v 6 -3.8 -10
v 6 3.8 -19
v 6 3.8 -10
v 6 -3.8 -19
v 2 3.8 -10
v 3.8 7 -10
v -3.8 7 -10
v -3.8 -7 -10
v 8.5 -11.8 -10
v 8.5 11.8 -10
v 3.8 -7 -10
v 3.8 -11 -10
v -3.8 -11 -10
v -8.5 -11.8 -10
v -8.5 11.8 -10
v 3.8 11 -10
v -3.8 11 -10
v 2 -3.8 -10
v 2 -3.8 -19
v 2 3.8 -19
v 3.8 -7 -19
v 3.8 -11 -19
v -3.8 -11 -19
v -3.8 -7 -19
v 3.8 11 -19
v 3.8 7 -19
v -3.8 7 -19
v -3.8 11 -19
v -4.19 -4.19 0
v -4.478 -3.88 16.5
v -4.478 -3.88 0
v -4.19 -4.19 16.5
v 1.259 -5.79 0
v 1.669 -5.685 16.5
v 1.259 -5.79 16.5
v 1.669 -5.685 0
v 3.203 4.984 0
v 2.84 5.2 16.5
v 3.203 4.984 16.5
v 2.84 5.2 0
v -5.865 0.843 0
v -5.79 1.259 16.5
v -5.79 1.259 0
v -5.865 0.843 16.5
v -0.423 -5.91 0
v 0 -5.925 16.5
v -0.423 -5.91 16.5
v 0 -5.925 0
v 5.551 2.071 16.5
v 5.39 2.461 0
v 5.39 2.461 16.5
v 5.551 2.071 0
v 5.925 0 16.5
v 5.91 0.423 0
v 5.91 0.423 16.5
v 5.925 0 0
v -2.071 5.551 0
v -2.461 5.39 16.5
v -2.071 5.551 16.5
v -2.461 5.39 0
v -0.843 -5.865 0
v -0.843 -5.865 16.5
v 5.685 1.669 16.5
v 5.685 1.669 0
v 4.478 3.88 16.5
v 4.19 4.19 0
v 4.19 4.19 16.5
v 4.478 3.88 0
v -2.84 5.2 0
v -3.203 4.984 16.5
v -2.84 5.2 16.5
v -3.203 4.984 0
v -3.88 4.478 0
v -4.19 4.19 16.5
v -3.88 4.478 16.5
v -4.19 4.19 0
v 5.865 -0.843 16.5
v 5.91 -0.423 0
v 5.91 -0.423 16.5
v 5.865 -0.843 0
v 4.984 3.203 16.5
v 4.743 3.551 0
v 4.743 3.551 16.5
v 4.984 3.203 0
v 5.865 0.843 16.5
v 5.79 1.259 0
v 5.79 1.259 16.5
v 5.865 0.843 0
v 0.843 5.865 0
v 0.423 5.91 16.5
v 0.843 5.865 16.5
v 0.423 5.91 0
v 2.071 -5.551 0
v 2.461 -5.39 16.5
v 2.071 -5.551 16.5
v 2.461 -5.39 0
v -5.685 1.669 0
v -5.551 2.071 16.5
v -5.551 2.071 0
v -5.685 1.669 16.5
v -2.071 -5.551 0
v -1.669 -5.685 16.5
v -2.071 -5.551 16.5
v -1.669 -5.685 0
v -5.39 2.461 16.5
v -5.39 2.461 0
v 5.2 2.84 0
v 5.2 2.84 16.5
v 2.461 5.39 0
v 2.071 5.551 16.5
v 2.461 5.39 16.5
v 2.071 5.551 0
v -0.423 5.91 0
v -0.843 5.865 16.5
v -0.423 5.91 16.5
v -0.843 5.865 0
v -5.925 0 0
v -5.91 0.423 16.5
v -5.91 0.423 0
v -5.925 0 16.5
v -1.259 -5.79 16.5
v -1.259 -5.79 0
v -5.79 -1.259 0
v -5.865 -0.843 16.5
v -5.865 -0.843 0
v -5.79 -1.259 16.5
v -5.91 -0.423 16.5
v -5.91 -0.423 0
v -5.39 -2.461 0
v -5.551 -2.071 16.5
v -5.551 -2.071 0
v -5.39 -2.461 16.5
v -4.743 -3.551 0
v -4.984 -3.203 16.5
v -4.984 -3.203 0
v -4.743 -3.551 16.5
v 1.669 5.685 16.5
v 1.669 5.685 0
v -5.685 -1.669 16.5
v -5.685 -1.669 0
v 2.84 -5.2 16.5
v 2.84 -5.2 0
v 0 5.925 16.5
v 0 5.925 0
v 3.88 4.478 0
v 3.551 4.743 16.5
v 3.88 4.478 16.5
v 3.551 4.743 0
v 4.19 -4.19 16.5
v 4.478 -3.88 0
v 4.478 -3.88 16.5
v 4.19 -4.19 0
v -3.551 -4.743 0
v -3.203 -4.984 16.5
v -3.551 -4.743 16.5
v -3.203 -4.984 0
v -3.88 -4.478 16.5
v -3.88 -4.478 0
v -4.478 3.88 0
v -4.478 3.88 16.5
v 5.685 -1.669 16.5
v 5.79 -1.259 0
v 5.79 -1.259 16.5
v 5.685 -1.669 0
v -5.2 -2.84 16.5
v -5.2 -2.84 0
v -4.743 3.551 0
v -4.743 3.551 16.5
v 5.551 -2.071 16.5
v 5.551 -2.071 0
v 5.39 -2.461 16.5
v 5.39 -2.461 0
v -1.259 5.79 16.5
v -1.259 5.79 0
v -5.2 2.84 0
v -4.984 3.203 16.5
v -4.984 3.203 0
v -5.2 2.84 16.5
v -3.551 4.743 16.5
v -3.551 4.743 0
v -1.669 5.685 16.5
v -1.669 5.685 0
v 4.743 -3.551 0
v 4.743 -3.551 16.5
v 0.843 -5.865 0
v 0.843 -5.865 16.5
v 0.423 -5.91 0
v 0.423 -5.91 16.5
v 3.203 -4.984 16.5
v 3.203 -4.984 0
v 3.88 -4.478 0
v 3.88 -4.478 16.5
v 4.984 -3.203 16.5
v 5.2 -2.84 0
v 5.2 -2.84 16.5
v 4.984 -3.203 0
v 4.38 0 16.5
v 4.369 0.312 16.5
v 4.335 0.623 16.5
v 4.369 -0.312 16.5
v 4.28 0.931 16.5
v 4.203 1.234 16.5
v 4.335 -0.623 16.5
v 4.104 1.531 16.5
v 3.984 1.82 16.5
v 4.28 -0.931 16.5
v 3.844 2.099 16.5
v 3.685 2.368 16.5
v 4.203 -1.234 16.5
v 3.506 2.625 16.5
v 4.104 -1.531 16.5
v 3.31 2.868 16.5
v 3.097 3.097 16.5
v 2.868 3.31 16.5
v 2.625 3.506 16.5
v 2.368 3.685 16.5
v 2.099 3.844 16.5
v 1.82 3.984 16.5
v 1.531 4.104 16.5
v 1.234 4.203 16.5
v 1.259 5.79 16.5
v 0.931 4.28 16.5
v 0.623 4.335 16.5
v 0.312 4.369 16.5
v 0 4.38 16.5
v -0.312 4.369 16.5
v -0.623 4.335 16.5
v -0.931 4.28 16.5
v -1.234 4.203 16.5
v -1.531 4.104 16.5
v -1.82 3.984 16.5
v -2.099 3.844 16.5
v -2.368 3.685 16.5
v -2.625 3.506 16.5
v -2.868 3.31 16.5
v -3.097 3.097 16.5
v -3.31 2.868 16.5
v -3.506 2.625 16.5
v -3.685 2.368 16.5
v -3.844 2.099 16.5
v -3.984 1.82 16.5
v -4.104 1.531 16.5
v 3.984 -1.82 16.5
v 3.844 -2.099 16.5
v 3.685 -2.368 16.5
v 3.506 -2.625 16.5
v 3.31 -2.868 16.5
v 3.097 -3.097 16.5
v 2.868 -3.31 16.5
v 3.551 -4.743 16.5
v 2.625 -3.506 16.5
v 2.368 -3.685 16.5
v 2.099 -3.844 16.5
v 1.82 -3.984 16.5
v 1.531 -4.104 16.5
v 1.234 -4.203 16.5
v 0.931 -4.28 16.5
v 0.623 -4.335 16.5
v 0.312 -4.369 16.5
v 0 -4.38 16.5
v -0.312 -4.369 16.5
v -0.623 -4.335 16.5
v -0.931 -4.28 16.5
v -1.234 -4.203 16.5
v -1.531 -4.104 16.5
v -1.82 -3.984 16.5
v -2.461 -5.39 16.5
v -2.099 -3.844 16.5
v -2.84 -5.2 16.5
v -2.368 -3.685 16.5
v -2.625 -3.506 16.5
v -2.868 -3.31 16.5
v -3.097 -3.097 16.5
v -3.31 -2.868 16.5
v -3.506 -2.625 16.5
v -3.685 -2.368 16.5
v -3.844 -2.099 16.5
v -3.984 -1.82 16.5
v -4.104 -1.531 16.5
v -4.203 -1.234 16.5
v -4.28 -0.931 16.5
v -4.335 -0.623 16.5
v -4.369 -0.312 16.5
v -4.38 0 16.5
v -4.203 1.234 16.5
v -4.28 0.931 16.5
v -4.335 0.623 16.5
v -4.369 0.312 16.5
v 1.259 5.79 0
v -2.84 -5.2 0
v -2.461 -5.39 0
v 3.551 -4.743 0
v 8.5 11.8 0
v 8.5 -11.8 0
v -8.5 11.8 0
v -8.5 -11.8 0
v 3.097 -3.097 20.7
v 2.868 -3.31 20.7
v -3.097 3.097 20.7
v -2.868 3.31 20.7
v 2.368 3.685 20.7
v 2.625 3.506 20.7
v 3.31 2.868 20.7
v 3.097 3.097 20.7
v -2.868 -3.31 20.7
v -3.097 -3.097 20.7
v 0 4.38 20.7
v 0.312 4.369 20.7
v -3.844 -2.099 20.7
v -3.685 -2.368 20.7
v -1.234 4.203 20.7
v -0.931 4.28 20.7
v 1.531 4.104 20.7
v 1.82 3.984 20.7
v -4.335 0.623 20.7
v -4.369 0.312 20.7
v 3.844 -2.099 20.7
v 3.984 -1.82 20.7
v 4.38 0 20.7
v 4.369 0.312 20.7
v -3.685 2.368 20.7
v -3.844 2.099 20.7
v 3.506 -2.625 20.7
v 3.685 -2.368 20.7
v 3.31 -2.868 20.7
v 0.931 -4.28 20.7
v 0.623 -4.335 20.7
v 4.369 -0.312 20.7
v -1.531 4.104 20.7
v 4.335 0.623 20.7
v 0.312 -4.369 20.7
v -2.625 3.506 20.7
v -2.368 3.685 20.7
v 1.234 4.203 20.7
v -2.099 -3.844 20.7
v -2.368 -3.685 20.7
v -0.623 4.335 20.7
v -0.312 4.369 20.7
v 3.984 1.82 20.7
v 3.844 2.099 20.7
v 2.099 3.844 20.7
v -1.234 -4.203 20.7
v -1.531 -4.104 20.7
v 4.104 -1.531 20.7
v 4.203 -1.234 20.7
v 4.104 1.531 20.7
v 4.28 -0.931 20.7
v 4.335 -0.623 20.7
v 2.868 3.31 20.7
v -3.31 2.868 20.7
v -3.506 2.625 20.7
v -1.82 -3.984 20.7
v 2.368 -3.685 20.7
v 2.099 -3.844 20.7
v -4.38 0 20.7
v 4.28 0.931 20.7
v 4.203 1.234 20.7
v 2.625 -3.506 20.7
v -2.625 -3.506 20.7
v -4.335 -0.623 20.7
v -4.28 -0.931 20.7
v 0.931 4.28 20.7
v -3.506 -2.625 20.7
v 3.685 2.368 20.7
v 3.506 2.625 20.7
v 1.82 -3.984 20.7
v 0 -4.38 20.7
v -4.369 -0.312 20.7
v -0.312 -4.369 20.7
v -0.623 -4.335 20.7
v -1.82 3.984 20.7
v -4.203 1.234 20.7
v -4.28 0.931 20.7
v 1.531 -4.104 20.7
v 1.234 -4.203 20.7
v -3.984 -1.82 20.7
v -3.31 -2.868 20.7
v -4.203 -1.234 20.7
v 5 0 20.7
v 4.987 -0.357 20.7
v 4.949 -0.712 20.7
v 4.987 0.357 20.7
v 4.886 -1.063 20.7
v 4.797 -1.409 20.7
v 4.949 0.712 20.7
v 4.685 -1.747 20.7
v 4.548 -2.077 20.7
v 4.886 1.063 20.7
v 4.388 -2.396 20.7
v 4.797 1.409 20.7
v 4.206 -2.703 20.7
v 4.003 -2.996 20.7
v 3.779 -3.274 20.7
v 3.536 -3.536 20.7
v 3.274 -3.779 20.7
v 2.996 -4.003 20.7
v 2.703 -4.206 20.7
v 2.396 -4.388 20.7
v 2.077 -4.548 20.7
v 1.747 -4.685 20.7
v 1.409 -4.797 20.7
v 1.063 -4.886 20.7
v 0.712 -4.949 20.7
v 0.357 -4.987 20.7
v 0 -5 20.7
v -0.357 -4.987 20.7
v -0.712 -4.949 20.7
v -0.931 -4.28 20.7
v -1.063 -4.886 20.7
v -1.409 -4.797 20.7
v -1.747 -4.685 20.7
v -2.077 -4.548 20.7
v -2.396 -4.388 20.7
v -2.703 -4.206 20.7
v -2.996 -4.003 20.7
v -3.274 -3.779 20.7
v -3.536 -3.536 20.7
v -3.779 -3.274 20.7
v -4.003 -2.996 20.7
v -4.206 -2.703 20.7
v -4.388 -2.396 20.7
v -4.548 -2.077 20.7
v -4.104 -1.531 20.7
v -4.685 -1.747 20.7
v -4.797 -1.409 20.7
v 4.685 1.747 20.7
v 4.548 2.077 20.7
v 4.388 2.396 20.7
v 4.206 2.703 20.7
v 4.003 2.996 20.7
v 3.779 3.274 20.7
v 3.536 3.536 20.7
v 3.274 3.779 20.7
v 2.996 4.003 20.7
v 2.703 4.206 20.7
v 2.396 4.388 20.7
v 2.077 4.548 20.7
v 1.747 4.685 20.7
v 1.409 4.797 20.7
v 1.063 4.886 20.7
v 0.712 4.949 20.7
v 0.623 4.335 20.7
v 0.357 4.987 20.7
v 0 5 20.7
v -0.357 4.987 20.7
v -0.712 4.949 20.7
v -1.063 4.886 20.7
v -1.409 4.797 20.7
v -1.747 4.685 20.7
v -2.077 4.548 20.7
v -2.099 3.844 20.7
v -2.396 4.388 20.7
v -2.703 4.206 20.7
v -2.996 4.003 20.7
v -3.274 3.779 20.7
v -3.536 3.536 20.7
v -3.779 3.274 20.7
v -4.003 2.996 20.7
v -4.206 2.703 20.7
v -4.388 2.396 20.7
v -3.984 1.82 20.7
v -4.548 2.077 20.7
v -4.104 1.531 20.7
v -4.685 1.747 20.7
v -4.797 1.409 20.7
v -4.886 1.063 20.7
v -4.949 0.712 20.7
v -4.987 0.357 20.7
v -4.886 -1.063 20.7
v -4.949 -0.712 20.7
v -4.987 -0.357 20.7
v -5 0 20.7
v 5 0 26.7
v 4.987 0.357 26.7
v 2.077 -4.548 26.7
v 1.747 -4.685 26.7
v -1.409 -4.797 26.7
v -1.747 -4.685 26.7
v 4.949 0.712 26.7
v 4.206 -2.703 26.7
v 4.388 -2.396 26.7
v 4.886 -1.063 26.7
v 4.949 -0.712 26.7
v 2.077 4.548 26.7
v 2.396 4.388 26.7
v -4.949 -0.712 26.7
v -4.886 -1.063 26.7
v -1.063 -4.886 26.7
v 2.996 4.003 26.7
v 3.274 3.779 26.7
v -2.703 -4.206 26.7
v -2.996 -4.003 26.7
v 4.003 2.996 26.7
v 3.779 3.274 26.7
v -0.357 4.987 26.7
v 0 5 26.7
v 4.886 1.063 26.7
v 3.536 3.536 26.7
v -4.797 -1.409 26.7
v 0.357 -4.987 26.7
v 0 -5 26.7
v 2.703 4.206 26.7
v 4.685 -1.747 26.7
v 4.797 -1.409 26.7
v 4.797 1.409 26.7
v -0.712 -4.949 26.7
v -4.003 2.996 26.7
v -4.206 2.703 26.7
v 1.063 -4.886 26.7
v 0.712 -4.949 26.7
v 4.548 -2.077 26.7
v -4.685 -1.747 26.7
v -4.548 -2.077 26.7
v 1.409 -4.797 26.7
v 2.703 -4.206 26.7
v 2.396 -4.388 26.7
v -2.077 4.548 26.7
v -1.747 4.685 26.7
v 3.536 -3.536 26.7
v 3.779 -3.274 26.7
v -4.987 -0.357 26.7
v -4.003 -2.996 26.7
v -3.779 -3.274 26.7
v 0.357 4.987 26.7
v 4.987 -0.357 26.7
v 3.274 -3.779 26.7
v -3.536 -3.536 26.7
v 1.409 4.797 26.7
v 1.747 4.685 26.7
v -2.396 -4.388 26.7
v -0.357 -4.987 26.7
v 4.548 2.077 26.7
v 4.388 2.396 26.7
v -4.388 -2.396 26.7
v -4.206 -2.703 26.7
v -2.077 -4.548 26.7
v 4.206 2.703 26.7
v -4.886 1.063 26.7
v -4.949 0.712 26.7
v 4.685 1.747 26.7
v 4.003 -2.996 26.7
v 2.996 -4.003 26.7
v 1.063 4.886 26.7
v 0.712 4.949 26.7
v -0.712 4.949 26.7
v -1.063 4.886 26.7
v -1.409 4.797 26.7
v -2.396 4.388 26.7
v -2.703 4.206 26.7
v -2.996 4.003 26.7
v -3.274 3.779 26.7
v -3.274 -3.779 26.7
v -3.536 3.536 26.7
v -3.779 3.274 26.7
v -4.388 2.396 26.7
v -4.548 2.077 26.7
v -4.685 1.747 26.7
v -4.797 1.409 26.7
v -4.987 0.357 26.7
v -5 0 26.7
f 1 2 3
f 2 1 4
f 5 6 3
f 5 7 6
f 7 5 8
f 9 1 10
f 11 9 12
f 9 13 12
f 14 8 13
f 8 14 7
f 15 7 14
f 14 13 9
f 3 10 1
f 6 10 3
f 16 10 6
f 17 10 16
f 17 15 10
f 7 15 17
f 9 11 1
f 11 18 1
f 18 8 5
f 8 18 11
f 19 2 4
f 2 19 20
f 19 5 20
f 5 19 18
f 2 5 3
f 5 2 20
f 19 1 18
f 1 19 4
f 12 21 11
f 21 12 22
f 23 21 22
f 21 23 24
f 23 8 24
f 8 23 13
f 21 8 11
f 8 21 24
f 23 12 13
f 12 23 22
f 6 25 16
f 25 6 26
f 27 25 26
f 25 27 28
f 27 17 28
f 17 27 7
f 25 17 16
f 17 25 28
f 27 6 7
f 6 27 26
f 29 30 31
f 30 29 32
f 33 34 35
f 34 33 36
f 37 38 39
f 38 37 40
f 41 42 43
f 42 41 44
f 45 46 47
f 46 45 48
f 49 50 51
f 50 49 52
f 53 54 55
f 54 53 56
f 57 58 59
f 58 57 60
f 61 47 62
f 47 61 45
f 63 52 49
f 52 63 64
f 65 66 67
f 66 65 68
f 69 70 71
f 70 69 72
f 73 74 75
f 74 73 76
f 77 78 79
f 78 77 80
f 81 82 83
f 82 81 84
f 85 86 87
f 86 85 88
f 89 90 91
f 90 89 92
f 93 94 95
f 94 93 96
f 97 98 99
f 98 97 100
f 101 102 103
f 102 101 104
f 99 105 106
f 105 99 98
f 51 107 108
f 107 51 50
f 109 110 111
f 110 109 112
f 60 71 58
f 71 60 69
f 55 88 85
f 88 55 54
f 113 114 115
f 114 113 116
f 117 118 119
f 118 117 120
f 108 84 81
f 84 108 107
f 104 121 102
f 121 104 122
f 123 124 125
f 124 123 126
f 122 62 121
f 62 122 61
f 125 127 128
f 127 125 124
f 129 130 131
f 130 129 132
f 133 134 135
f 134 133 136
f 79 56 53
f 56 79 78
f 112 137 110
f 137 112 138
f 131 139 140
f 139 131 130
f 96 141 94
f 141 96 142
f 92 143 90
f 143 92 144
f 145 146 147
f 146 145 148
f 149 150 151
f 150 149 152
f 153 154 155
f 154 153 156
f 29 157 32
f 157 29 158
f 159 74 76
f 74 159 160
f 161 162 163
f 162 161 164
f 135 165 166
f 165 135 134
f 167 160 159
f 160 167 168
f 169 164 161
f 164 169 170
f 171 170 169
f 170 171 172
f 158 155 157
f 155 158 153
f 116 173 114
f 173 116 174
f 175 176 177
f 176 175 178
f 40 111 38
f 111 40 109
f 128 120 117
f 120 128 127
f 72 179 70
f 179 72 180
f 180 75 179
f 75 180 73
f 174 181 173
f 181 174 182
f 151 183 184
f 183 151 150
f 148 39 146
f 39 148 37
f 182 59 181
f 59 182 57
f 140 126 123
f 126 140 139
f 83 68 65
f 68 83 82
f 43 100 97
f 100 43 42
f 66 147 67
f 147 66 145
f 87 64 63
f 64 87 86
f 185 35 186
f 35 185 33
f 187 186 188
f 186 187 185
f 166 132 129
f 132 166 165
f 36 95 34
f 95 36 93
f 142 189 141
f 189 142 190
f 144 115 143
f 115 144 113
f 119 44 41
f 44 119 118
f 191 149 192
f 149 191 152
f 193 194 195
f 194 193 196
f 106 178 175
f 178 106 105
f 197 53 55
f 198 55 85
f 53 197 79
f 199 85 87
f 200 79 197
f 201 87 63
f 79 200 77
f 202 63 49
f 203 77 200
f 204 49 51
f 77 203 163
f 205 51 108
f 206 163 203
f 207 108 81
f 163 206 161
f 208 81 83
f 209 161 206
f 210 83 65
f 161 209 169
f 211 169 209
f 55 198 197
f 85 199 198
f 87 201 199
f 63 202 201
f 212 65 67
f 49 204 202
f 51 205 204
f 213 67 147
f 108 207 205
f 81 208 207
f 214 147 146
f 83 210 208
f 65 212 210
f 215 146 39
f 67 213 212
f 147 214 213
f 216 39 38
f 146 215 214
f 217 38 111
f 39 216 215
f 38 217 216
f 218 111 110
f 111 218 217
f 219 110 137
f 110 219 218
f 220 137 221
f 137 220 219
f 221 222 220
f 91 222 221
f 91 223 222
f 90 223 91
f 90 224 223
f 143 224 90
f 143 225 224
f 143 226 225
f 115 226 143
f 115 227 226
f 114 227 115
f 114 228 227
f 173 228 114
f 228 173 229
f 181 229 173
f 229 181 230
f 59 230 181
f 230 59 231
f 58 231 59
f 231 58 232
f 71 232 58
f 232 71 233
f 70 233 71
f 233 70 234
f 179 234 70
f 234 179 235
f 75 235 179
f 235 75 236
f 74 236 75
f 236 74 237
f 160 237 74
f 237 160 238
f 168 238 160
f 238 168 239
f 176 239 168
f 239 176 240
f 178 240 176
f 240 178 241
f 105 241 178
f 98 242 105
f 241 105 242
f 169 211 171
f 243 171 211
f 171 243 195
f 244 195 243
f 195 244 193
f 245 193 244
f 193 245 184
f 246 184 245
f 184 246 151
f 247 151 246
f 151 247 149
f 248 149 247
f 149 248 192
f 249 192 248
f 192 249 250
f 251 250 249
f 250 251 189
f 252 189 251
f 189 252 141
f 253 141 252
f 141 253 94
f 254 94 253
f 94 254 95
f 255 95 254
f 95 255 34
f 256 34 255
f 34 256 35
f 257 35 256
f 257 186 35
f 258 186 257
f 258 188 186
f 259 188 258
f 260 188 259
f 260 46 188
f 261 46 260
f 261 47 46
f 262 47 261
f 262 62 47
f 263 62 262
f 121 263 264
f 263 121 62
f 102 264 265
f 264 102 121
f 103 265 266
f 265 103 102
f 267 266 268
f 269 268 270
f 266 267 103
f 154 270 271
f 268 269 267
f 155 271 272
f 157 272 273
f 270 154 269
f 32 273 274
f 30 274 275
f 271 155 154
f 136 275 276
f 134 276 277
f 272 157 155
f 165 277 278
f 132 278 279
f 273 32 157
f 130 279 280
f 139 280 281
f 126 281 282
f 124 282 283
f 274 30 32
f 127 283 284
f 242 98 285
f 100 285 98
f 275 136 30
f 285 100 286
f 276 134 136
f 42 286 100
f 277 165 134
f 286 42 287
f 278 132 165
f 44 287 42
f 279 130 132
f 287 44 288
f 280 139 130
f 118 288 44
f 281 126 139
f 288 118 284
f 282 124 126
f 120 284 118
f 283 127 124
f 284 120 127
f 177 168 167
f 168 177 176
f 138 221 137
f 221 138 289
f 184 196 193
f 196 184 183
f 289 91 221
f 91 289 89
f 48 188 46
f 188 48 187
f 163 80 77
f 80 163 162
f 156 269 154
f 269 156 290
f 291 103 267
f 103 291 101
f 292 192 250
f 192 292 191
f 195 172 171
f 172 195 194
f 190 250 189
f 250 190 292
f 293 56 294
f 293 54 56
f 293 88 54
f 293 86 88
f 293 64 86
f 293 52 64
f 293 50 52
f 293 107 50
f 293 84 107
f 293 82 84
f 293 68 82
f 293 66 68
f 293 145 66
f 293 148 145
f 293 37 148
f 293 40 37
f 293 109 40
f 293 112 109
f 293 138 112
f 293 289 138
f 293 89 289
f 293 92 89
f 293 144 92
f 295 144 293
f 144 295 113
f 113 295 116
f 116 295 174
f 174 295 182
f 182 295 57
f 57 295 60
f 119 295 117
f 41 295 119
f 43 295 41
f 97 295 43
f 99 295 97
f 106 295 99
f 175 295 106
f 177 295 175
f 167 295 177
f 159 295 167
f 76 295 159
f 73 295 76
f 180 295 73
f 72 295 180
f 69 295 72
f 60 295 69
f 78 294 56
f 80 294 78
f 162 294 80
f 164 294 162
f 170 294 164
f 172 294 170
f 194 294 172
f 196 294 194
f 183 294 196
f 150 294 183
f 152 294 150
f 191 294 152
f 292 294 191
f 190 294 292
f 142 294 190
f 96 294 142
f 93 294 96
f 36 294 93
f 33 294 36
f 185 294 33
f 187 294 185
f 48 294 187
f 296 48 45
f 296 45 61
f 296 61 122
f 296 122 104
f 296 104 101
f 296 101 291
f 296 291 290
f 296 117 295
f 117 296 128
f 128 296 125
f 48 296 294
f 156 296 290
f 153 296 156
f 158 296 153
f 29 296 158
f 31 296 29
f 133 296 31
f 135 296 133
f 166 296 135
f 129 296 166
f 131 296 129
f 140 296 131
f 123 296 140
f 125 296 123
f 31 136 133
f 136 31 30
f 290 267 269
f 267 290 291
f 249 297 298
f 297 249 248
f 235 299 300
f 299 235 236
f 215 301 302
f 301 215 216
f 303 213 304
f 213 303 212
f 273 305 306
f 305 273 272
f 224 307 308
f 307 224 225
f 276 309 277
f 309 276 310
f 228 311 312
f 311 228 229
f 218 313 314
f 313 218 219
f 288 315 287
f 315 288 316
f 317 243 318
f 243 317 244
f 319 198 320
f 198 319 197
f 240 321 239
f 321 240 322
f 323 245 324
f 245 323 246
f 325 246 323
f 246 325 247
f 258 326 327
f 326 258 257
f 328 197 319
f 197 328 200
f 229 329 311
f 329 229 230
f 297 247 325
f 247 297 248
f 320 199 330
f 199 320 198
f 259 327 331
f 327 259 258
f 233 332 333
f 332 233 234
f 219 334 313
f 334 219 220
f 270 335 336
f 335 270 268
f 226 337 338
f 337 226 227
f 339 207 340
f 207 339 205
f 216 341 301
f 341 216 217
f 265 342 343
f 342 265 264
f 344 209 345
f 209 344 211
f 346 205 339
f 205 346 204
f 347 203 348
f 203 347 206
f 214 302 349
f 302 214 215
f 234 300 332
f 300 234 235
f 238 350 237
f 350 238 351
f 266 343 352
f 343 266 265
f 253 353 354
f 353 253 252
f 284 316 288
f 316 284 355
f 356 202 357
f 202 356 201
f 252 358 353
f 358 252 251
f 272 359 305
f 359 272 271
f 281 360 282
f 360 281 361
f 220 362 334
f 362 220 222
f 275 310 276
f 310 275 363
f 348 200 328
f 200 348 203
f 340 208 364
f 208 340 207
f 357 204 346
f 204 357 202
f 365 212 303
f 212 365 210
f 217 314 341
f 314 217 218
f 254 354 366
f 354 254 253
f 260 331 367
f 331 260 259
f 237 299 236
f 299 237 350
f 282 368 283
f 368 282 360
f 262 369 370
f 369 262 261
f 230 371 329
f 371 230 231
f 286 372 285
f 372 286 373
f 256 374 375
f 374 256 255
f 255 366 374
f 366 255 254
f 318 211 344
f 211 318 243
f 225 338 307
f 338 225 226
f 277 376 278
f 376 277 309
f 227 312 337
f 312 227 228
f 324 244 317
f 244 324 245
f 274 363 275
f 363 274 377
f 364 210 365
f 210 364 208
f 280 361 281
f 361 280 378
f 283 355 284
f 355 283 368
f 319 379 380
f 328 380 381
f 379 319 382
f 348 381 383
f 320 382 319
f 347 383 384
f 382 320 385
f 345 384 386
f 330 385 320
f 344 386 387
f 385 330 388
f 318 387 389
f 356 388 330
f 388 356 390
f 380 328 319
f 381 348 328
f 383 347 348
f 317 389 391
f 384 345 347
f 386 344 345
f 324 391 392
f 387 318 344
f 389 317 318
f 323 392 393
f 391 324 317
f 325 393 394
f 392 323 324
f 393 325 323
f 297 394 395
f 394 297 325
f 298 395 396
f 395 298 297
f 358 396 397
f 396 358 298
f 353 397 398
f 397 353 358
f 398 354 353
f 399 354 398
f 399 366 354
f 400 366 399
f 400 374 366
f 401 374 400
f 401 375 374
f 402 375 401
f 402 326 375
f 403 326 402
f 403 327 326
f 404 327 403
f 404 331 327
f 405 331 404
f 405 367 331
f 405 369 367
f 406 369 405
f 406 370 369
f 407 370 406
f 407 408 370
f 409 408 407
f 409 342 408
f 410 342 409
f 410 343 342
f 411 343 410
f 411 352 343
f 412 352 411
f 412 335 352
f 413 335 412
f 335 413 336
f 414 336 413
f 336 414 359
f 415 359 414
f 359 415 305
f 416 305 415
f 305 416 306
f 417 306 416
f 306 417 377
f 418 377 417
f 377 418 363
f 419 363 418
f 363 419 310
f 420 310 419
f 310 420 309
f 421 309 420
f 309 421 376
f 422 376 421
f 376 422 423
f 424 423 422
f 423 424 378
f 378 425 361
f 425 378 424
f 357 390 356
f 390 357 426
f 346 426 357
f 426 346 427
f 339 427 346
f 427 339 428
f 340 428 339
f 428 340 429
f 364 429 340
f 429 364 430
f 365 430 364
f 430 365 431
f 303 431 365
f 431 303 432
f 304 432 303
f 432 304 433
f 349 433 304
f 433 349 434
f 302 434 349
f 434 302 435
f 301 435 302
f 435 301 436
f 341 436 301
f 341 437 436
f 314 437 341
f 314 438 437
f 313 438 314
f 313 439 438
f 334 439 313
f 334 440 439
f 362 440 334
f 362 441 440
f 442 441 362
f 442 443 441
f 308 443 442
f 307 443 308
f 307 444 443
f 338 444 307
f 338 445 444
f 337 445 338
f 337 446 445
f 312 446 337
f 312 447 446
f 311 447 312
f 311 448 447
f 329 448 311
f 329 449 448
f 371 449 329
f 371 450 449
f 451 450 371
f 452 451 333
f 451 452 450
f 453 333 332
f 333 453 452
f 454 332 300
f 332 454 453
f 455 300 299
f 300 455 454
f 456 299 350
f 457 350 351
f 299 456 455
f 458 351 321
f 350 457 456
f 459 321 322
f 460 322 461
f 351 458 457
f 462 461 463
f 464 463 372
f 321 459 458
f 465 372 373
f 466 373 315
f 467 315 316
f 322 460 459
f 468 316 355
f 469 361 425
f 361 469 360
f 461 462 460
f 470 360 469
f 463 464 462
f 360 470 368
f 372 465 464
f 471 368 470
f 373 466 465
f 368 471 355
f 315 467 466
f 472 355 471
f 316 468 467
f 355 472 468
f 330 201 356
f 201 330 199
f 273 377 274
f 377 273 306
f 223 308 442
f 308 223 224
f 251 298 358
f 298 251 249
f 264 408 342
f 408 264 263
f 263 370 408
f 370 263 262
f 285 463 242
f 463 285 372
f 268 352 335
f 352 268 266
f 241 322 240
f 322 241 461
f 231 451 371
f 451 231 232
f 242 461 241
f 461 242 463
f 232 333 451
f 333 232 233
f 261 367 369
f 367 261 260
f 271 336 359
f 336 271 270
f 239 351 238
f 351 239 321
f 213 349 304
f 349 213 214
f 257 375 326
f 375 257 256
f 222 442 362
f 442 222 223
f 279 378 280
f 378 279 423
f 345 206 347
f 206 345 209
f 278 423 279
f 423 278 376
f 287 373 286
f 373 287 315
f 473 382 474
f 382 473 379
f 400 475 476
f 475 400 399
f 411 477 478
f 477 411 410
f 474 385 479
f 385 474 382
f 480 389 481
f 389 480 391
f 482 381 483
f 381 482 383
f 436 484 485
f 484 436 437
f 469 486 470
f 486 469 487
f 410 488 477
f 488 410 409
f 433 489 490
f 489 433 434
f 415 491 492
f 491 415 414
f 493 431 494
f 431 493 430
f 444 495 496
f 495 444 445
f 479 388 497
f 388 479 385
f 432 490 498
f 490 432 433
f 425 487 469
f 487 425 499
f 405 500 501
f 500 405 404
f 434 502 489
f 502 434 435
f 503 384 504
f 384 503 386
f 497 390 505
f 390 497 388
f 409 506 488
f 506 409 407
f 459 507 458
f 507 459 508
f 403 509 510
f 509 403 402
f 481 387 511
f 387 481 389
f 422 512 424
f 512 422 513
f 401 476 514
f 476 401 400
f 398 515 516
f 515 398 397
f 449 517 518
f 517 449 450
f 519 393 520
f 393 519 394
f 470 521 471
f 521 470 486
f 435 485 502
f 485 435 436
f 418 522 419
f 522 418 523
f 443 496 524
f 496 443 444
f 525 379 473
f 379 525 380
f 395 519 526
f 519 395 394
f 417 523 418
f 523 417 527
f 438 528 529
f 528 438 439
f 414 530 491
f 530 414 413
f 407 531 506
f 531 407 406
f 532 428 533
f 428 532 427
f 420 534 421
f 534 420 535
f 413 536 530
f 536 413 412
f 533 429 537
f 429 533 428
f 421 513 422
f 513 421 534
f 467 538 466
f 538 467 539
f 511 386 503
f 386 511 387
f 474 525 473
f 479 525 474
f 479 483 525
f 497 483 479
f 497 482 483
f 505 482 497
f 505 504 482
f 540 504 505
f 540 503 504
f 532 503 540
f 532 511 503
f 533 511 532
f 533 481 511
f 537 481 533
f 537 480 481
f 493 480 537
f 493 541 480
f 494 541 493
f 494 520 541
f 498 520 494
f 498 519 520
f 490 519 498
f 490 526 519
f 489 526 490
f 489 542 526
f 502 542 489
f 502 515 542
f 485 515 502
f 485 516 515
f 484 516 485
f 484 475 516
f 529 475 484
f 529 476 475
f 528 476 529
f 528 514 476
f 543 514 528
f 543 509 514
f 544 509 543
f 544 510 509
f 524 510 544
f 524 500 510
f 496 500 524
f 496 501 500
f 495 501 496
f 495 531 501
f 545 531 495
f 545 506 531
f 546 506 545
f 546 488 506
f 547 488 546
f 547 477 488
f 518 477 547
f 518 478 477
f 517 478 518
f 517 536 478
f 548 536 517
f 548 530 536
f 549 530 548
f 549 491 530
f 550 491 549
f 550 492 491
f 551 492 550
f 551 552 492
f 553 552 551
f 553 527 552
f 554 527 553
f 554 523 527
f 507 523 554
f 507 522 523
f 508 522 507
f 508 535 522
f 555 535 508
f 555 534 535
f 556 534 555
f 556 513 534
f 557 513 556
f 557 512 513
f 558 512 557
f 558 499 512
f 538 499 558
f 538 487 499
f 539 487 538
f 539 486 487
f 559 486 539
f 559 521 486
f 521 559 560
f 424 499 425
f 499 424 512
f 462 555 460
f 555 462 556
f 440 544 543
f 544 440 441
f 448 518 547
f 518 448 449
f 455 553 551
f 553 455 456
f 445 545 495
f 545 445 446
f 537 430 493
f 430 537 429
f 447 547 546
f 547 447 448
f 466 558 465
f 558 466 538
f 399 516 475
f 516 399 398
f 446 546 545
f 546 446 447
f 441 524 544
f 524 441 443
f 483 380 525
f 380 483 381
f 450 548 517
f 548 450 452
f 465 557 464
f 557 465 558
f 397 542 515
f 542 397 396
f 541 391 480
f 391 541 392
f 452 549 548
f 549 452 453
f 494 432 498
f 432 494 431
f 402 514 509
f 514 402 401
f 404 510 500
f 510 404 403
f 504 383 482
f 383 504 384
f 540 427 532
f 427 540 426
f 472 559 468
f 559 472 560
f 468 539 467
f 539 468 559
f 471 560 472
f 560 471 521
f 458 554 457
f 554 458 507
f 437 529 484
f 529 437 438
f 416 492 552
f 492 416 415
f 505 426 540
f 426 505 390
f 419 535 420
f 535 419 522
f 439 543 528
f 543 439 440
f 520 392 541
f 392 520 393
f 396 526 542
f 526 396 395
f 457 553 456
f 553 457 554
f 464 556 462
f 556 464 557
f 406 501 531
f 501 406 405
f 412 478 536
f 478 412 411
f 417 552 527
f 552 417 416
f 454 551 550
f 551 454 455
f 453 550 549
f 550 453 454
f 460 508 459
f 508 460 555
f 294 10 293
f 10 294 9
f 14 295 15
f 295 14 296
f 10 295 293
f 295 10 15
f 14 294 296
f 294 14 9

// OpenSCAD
//=================================================================================
// switch2.scad
// Model for pushbutton power cutoff switches
//
// Dr Tom Flint, 12 Dec 2020
//=================================================================================

//-------------------------------------------------------
module switch2(){

  // stack
  cylinder(r=11.85/2,h=16.5,$fn=88);
  translate([0,0,16.5])
  cylinder(r=8.76/2,h=4.2,$fn=88);
  translate([0,0,16.5+4.2])
  cylinder(r=10/2,h=6,$fn=88);

  // body
  translate([0,0,-5])
  cube([17,23.6,10],center=true);

  // wiring tabs
  color("red")
  translate([0,0,-19]){
    translate([2,-7.6/2,0])
    cube([4,7.6,9]);
    translate([-7.6/2,-11,0])
    cube([7.6,4,9]);
    translate([-7.6/2,7,0])
    cube([7.6,4,9]);
    
  }

}

//==================================================================================


switch2();


//==================================================================================
